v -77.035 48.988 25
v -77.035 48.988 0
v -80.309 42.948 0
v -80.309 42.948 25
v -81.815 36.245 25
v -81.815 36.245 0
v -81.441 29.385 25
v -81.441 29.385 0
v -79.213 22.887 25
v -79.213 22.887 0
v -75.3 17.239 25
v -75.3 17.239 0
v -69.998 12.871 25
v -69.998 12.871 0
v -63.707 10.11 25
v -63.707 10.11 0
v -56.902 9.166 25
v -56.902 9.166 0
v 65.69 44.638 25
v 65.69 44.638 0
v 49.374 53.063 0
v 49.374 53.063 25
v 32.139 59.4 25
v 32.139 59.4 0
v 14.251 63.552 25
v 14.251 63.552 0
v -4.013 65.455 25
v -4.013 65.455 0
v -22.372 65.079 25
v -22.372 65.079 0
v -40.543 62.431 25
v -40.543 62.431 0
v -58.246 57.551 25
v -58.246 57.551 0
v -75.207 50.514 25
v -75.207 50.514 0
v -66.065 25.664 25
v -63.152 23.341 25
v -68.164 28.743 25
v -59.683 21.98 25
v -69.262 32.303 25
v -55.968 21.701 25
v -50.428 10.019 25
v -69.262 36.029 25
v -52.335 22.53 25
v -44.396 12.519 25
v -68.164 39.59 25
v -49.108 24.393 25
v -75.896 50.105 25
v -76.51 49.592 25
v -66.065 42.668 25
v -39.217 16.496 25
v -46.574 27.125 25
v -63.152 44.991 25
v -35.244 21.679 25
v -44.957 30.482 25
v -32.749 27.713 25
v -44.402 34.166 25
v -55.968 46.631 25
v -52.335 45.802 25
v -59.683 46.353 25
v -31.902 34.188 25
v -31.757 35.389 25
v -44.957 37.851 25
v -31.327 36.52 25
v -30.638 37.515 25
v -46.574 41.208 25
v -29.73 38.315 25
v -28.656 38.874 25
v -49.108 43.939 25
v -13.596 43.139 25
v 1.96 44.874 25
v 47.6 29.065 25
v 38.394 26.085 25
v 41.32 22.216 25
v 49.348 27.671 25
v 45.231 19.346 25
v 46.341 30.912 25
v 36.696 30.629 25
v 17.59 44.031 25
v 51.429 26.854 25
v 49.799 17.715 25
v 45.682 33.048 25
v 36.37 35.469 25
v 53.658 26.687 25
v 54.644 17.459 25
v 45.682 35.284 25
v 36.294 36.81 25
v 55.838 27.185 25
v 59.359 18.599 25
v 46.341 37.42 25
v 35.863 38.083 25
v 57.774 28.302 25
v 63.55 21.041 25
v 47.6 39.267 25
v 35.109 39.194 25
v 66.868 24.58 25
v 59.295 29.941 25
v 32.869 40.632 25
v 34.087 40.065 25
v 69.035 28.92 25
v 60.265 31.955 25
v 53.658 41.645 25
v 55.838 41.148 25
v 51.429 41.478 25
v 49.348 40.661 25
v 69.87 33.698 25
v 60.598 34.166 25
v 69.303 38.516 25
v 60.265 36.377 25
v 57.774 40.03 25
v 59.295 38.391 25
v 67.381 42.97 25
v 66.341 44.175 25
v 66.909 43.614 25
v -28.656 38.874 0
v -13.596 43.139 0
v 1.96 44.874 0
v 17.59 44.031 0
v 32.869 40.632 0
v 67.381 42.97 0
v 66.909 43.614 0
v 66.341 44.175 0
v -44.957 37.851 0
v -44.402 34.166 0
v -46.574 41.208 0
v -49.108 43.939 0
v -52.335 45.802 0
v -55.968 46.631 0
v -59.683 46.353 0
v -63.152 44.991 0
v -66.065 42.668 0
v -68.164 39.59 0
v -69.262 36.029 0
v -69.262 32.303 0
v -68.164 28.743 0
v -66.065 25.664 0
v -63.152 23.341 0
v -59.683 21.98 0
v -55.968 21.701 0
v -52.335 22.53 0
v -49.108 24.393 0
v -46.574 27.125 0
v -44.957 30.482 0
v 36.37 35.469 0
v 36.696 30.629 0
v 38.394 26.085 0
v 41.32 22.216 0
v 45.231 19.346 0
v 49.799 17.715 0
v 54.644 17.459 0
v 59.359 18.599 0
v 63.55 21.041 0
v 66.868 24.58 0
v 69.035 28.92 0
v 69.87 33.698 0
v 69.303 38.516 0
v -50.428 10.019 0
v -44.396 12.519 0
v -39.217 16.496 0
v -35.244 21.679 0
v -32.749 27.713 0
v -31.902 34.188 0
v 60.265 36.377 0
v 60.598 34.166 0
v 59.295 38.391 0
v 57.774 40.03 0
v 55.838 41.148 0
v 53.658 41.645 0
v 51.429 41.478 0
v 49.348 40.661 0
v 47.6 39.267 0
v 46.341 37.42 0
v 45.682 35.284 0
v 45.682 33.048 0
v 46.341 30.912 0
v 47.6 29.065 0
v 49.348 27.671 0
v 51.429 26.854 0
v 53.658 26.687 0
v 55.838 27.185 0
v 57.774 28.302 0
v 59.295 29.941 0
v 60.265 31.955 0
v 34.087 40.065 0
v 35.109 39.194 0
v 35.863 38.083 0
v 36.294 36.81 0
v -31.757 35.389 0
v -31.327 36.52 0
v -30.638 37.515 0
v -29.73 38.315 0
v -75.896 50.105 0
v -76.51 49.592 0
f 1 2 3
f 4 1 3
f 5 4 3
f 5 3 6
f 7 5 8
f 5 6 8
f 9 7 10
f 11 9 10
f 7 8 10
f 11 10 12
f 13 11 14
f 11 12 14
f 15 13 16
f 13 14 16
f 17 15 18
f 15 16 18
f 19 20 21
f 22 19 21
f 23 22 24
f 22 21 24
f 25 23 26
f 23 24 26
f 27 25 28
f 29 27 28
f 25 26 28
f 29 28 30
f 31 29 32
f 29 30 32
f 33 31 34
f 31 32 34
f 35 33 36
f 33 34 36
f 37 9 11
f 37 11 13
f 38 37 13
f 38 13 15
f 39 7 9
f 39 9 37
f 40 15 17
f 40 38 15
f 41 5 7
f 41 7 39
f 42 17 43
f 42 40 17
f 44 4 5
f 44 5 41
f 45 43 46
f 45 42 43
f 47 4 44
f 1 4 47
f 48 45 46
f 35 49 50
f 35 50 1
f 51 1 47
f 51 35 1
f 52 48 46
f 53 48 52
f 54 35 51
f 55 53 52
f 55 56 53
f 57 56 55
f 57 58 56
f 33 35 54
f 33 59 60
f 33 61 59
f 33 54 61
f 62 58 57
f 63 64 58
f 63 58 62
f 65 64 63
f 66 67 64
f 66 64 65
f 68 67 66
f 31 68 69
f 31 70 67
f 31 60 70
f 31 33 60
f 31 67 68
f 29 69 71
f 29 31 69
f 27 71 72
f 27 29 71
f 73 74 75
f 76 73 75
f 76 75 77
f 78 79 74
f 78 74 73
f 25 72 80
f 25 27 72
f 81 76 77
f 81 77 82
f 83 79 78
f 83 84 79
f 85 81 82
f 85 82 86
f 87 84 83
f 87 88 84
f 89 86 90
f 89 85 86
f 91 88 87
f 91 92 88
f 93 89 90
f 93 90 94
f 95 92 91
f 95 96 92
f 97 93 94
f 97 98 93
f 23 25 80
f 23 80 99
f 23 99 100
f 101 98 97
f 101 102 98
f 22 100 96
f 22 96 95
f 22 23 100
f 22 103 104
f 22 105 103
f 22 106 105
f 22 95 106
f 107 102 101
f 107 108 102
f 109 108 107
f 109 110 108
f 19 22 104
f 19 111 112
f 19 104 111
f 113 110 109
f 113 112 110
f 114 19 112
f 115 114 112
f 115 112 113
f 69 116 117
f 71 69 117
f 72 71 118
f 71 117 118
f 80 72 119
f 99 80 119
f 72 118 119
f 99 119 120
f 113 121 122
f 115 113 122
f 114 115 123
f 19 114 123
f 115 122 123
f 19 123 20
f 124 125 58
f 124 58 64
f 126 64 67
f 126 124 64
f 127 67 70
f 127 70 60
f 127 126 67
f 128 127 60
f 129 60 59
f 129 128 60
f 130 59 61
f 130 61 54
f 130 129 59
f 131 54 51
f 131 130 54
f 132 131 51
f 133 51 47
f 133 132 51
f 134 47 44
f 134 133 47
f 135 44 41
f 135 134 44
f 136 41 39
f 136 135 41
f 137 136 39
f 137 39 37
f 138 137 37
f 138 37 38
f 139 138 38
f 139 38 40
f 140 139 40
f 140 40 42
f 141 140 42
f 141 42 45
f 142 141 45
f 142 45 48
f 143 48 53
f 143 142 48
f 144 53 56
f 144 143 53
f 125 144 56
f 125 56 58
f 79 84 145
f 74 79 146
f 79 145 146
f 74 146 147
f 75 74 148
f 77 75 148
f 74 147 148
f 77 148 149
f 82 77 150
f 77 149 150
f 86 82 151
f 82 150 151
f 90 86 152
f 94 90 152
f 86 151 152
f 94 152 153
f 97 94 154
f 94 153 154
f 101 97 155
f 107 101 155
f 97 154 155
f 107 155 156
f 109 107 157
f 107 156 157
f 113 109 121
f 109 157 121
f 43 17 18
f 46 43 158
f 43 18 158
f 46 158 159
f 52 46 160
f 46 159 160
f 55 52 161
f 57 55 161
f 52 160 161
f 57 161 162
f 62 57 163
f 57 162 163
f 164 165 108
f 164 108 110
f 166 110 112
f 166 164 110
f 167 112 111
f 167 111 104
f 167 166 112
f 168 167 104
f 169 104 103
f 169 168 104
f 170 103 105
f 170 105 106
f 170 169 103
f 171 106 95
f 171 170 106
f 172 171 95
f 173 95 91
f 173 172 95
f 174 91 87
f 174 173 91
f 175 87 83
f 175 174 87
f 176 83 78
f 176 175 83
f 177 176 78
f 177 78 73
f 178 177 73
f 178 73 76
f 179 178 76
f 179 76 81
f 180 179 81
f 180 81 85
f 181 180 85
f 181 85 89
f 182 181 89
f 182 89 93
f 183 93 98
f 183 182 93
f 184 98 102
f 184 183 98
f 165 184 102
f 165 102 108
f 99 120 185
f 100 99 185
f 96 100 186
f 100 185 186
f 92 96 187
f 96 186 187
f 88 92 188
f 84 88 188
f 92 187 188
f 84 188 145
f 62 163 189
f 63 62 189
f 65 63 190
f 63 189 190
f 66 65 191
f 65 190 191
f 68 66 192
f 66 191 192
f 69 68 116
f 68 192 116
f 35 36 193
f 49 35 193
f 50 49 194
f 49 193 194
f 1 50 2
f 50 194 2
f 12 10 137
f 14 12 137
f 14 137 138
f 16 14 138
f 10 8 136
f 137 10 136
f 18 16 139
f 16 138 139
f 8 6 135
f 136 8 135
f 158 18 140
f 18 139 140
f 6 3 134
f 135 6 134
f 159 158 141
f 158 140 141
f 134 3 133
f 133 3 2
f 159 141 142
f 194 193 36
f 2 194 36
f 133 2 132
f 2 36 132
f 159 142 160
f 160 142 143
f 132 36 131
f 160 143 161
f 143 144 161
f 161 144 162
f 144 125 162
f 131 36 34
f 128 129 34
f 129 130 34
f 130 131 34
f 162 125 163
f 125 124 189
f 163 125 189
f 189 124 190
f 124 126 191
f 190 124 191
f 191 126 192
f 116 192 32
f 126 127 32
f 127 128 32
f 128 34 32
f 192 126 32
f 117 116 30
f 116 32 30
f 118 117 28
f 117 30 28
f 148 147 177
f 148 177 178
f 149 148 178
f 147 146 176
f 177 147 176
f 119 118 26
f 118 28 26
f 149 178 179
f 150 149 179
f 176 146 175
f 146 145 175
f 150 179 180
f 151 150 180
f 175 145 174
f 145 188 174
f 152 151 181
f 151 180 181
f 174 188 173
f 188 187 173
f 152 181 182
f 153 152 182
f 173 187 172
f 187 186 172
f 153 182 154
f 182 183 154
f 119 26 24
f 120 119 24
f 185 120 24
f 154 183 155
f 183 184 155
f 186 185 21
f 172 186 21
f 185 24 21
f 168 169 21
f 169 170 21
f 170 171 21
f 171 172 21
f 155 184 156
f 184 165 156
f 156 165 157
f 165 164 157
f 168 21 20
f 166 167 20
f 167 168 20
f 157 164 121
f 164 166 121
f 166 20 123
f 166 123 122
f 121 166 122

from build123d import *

# Parameters (mm, degrees)
F0_R     = 12.5
F0_R_2   = 7.5
F1_DEPTH = 25


with BuildPart() as f1:
    # F0 (on Top) → F1 (new body)
    with BuildSketch(Plane.XY):
        with BuildLine():
            ThreePointArc((-75.207108, 50.513876), (-76.212982, 49.861177), (-77.034532, 48.987763))
            ThreePointArc((-77.034532, 48.987763), (-79.21274, 22.88653), (-56.901976, 9.16615))
            ThreePointArc((-56.901976, 9.16615), (-39.216747, 16.496044), (-31.901986, 34.187538))
            ThreePointArc((-31.901986, 34.187538), (-31.012413, 37.038638), (-28.656223, 38.873979))
            ThreePointArc((-28.656223, 38.873979), (1.960124, 44.874089), (32.869195, 40.632465))
            ThreePointArc((32.869195, 40.632465), (35.523586, 38.663847), (36.370146, 35.469386))
            ThreePointArc((36.370146, 35.469386), (57.04258, 17.857846), (67.38122, 42.970162))
            ThreePointArc((67.38122, 42.970162), (66.636188, 43.906127), (65.690151, 44.638329))
            ThreePointArc((65.690151, 44.638329), (-4.012921, 65.454779), (-75.207108, 50.513876))
        make_face()
        with Locations((-56.901976, 34.16615)):
            Circle(F0_R, mode=Mode.SUBTRACT)
        with Locations((53.098024, 34.16615)):
            Circle(F0_R_2, mode=Mode.SUBTRACT)
    extrude(amount=F1_DEPTH)


solid = f1.part
